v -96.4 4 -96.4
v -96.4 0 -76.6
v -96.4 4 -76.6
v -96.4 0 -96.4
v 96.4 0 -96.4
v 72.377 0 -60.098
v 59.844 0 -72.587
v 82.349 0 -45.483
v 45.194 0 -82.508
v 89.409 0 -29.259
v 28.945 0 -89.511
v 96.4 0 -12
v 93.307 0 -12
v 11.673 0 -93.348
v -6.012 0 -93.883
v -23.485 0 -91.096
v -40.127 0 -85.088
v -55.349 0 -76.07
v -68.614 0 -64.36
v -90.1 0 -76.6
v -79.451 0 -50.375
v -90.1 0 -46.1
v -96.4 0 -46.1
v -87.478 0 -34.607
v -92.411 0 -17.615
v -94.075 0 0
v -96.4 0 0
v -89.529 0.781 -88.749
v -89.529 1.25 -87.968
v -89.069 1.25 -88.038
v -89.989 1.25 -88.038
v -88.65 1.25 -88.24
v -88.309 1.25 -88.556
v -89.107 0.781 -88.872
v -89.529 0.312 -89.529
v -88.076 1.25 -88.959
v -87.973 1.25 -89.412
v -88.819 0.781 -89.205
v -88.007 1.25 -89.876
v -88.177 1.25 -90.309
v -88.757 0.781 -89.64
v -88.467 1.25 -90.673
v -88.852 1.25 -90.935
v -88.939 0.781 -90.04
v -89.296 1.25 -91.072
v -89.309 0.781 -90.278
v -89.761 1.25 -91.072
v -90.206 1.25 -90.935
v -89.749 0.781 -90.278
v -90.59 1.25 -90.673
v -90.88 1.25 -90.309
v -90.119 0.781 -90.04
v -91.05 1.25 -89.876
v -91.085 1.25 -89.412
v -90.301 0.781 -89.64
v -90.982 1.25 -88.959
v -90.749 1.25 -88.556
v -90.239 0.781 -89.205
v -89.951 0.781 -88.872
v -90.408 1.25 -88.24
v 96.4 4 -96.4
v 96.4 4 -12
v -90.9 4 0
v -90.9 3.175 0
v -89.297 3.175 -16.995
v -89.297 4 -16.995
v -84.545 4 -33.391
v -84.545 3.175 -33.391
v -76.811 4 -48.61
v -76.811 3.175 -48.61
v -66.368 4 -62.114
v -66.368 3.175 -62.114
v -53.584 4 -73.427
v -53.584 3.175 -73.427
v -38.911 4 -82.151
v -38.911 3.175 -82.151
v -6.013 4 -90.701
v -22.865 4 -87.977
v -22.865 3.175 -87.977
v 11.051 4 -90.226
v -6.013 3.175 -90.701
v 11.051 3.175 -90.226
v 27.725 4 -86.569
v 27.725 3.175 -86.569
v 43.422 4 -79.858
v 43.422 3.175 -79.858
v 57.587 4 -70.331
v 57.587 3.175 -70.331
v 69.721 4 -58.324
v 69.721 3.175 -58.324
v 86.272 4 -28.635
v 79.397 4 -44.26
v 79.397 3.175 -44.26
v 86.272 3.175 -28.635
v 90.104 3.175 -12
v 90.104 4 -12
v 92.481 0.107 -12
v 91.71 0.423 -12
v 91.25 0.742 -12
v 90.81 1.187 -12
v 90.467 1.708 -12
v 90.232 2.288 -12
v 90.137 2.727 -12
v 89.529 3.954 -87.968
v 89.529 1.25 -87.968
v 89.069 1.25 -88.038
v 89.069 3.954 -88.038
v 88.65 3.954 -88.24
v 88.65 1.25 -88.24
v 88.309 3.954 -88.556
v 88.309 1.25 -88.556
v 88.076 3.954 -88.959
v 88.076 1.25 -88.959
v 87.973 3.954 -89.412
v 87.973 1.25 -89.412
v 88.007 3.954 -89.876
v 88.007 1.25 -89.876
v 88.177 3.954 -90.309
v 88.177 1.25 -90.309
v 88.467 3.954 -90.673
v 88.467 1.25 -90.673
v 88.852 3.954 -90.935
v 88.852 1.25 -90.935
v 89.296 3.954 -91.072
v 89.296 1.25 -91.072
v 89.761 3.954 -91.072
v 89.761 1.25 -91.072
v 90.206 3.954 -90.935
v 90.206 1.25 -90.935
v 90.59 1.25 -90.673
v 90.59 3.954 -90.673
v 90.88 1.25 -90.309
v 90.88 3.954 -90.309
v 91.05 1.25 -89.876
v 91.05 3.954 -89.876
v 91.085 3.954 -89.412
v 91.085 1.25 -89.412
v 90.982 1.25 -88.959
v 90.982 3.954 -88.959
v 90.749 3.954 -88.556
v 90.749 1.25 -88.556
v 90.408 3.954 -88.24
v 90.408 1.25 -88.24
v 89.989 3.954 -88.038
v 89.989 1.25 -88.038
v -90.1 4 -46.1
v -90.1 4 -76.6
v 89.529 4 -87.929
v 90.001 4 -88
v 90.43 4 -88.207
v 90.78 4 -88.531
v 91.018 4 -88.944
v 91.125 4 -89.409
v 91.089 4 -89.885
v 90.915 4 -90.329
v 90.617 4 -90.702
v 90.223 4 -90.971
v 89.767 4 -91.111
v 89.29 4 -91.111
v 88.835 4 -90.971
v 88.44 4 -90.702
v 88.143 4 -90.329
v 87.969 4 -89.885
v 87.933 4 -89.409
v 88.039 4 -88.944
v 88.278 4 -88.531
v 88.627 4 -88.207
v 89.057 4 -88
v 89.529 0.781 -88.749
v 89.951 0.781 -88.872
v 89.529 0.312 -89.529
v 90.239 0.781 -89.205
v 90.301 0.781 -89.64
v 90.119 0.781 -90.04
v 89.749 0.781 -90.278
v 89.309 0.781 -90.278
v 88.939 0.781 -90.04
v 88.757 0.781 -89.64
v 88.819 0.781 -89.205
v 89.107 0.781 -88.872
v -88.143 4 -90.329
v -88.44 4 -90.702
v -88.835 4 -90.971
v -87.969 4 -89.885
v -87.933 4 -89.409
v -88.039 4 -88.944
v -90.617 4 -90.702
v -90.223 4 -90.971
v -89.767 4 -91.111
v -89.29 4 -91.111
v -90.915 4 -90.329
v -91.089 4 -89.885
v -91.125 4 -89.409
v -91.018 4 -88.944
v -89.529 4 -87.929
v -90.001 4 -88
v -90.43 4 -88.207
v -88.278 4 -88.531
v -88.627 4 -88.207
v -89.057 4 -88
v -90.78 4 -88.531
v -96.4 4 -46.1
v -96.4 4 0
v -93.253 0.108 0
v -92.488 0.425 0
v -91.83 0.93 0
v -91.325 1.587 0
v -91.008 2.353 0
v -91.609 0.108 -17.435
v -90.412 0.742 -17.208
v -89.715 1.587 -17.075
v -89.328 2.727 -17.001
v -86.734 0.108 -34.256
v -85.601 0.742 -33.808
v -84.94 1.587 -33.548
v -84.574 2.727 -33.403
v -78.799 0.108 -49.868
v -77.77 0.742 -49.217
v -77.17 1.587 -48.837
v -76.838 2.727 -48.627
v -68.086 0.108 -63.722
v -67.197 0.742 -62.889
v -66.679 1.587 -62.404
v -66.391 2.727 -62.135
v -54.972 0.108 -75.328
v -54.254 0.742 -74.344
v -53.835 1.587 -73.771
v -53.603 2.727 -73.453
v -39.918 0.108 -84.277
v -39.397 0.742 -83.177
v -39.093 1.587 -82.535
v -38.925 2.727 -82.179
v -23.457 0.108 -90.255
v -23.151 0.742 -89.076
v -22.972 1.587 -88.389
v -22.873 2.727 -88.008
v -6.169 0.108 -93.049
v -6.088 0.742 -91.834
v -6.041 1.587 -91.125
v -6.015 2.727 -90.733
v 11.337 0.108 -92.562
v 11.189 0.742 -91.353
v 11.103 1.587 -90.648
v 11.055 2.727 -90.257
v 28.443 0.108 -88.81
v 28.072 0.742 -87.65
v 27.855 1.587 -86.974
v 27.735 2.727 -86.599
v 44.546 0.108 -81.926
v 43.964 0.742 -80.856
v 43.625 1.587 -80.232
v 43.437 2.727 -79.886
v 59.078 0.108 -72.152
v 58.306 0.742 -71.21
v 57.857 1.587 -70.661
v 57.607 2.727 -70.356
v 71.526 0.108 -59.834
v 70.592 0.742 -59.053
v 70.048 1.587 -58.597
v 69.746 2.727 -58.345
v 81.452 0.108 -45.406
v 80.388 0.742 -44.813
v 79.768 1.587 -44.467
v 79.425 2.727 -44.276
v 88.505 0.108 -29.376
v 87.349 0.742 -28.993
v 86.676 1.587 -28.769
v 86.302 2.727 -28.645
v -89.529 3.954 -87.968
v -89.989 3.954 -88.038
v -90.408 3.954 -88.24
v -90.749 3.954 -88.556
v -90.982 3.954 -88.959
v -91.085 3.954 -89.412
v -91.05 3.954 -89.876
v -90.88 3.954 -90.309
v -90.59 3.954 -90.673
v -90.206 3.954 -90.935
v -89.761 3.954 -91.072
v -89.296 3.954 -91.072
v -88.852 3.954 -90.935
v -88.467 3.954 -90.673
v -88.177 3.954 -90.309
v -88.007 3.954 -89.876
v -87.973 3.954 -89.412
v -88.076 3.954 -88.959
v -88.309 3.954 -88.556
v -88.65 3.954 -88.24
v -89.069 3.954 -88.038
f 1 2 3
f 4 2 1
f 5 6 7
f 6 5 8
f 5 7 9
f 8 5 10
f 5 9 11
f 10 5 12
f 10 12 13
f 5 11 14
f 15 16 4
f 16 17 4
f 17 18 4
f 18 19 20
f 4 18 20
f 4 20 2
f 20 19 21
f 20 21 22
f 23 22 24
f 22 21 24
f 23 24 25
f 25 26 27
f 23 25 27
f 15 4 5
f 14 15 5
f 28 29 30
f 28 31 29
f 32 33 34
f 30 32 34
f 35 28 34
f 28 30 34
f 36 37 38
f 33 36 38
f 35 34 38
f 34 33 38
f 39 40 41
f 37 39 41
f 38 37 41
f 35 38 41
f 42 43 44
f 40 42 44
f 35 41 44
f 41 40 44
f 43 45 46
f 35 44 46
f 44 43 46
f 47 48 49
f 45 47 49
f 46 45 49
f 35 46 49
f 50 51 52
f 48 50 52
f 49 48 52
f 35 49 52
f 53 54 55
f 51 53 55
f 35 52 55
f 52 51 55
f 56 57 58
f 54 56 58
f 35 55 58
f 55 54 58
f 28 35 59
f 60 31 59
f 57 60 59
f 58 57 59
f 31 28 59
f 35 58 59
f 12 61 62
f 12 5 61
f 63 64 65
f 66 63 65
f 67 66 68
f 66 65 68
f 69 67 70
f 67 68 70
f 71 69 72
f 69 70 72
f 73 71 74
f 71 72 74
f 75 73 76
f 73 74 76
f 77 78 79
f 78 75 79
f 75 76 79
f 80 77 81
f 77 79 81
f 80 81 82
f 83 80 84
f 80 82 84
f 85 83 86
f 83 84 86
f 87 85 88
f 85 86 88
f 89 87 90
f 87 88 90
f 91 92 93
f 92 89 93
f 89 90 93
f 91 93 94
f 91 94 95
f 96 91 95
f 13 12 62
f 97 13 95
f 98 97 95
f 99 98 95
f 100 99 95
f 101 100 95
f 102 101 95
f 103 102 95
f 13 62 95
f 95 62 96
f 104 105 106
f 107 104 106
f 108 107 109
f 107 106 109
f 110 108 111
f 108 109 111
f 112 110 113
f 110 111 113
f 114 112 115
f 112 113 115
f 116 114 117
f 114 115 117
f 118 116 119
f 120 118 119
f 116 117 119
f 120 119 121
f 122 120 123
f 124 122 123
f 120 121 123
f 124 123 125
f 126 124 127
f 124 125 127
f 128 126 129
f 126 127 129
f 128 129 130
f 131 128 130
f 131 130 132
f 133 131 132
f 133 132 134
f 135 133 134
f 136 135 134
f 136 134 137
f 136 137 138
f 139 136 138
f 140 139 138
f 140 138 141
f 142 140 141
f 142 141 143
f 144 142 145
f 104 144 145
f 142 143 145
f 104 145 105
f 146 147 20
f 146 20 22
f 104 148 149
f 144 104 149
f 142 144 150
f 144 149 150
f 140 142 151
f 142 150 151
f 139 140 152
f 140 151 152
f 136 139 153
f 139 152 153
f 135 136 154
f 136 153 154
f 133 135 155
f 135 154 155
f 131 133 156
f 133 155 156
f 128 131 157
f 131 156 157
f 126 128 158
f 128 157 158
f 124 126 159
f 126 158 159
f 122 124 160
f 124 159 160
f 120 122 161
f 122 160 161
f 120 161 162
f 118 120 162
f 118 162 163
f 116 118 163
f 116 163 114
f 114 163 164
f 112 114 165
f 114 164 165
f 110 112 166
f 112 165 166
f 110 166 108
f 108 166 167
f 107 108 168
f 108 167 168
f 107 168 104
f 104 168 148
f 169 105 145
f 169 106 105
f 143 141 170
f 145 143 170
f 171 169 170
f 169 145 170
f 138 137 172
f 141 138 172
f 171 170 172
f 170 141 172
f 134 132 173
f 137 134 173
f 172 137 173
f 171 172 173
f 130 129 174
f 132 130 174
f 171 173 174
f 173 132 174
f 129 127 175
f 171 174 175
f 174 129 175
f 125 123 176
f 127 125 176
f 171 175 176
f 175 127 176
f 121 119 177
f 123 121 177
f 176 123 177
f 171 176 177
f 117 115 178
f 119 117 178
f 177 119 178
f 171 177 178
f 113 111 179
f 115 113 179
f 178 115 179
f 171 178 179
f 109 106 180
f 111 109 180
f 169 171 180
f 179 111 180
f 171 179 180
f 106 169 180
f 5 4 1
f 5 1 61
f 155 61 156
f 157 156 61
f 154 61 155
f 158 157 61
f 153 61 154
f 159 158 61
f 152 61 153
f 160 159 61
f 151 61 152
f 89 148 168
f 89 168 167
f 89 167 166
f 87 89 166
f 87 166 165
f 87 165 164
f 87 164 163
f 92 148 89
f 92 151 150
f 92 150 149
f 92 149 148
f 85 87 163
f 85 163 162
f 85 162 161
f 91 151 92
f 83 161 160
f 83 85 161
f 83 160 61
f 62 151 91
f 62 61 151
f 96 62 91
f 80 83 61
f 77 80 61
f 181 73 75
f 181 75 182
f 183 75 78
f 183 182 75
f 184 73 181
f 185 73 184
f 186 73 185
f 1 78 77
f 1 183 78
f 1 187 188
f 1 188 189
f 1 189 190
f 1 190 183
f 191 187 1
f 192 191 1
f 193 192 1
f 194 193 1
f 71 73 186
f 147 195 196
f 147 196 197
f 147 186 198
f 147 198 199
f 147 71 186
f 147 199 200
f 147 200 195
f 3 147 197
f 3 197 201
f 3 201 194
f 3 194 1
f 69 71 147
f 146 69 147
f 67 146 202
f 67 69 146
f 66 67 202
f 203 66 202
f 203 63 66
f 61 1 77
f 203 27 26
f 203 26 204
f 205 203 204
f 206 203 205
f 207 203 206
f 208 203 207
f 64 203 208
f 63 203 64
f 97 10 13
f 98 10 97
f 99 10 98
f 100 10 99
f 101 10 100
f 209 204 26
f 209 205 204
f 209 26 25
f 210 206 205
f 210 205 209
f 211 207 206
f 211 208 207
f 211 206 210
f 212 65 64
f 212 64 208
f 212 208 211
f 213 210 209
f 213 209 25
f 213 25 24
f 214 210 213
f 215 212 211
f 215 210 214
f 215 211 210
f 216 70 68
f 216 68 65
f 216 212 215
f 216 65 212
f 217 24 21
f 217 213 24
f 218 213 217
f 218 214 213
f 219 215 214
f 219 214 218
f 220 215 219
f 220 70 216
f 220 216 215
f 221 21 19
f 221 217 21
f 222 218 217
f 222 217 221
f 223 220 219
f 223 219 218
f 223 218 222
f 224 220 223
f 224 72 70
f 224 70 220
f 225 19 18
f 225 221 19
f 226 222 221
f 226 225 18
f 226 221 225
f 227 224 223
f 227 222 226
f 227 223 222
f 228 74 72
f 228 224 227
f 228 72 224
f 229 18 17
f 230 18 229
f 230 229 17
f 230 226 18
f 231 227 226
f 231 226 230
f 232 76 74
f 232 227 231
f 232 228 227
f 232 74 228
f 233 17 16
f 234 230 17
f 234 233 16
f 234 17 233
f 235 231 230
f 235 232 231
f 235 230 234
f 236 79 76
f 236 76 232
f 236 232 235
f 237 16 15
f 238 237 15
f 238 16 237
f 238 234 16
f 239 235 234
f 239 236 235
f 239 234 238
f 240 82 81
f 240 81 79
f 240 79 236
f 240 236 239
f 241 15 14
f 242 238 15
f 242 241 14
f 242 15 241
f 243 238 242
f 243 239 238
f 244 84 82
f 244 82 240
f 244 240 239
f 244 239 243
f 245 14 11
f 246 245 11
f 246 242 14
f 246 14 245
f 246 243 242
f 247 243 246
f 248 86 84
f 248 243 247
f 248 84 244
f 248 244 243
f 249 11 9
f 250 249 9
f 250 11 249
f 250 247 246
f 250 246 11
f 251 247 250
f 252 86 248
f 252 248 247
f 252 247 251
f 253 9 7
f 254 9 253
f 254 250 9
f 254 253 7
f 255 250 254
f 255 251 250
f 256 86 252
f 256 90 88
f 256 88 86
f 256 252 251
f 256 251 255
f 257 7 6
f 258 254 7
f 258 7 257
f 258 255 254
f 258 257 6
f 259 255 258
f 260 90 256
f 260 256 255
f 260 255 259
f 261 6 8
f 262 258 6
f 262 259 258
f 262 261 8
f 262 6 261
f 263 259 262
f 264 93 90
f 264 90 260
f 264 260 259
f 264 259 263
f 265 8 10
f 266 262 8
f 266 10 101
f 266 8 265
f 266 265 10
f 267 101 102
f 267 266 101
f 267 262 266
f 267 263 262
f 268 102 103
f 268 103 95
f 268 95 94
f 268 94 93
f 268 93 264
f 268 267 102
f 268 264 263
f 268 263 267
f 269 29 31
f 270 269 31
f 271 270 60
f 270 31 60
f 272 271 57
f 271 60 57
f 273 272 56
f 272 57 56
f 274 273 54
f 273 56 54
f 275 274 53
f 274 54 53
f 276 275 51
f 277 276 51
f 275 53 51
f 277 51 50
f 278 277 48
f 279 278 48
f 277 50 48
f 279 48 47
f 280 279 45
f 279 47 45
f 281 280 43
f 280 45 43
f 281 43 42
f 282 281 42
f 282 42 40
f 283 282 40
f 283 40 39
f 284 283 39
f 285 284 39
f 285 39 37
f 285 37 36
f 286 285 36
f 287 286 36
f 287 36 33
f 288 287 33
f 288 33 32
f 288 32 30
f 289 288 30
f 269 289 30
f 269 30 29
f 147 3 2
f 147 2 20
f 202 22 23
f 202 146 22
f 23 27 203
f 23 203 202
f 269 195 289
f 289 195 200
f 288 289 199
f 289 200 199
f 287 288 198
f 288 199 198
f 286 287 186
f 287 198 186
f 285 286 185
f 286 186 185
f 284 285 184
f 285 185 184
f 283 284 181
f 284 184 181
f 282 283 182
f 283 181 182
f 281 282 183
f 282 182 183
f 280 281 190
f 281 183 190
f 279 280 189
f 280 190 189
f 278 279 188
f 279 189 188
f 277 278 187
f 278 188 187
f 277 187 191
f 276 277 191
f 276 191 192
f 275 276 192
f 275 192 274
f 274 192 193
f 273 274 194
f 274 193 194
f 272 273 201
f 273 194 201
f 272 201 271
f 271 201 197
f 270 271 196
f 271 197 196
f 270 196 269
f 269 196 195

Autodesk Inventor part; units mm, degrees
ref_plane "YZ Plane" through (0, 0, 0) normal (1, 0, 0) x (0, 1, 0)
ref_plane "XZ Plane" through (0, 0, 0) normal (0, 1, 0) x (-1, 0, 0)
ref_plane "XY Plane" through (0, 0, 0) normal (0, 0, 1) x (1, 0, 0)
sketch "Sketch1" plane through (0, 0, 0) normal (0, 1, 0) x (-1, 0, 0)
  line L0 (101.6, -101.6) -> (-101.6, -101.6)
  line L1 (-101.6, -101.6) -> (-101.6, 101.6)
  line L2 (-101.6, 101.6) -> (101.6, 101.6)
  line L3 (101.6, 101.6) -> (101.6, -101.6)
  line L4 (96.6, -96.6) -> (-96.6, -96.6)
  line L5 (-96.6, -96.6) -> (-96.6, 96.6)
  line L6 (-96.6, 96.6) -> (96.6, 96.6)
  line L7 (96.6, 96.6) -> (96.6, -96.6)
  line L8 (101.6, 101.6) -> (-40.4, 101.6)
  circle A0 centre (0, 0) radius 88.9
  line L9 (-40.4, 101.6) -> (-101.6, 40.4)
  line L10 (-45.4, 101.6) -> (-101.6, 45.4)
  line L11 (96.6, 96.6) -> (96.6, 101.6)
  line L12 (-45.4, 101.6) -> (-35.4, 101.6)
  line L13 (-35.4, 101.6) -> (-35.4, 96.6)
  line L14 (-35.4, 96.6) -> (-45.4, 96.6)
  line L15 (-45.4, 96.6) -> (-45.4, 101.6)
  line L16 (-101.6, 39.4) -> (-39.4, 101.6)
  line L17 (96.4, -96.4) -> (-96.4, -96.4)
  line L18 (-96.4, -96.4) -> (-96.4, 96.4)
  line L19 (-96.4, 96.4) -> (96.4, 96.4)
  line L20 (96.4, 96.4) -> (96.4, -96.4)
  circle A1 centre (0, 0) radius 90.9
  point P0 (96.6, 51.2168)
  point P1 (101.6, 40.4)
  point P2 (101.6, -40.4)
  point P3 (96.6, -51.2168)
  point P4 (-96.6, 45.4)
  point P5 (-45.4, 96.6)
  point P6 (-44.6, 96.4)
  point P7 (-96.4, 44.6)
  dimension "d0" = 203.2
  dimension "d1" = 203.2
  dimension "d2" = 101.6
  dimension "d3" = 101.6
  dimension "d4" = 5
  dimension "d5" = 5
  dimension "d6" = 5
  dimension "d7" = 5
  dimension "d8" = 142
  dimension "d9" = 61.2
  dimension "d10" = 177.8
  dimension "d11" = 5
  dimension "d12" = 5
  dimension "d13" = 10
  dimension "d14" = 1
  dimension "d15" = 0.2
  dimension "d16" = 0.2
  dimension "d17" = 0.2
  dimension "d18" = 0.2
  dimension "d64" = 181.8
extrude "Extrusion1" add sketch "Sketch1" along normal blind 4 contours L16 L19 L20 L17 L18
sketch "Sketch6" plane through (0, 4, 0) normal (0, 1, 0) x (1, 0, 0)
  line L0 (96.4, 96.4) -> (-96.4, 96.4) projected
  line L1 (96.4, 96.4) -> (88.4, 96.4)
  line L2 (88.4, 96.4) -> (88.4, -45.6)
  line L3 (88.4, -45.6) -> (96.4, -45.6)
  line L4 (96.4, -45.6) -> (96.4, 96.4)
  line L5 (96.4, -44.6) -> (96.4, 96.4) projected
  line L6 (88.4, -12) -> (96.4, -12)
  line L7 (96.4, -12) -> (96.4, 12)
  line L8 (96.4, 12) -> (88.4, 12)
  line L9 (88.4, 12) -> (88.4, -12)
  line L10 (0, 0) -> (96.4, 0)
  point P0 (96.4, -12)
  dimension "d58" = 8
  dimension "d59" = 142
  dimension "d62" = 12
  dimension "d63" = 12
extrude "Extrusion6" cut sketch "Sketch6" against normal blind 25.4 contours L4 L10 L2 L8 | L4 L6 L2 L10
sketch "Sketch8" plane through (0, 4, 0) normal (0, 1, 0) x (1, 0, 0)
  line L0 (-96.6, 96.6) -> (-96.6, -96.6)
  line L1 (96.6, 96.6) -> (-96.6, 96.6)
  line L2 (-96.6, 96.6) -> (96.6, 96.6)
  line L3 (96.6, -45.4) -> (45.4, -96.6)
  line L4 (96.6, 96.6) -> (96.6, -45.4)
  line L5 (96.6, -45.4) -> (45.4, -96.6)
  line L6 (45.4, -96.6) -> (-96.6, -96.6)
  line L7 (-96.6, -96.6) -> (-96.6, 96.6)
  line L8 (-96.6, 96.6) -> (-89.5289, 89.5289)
  circle A0 centre (-89.5289, 89.5289) radius 5
  circle A1 centre (-89.5289, 89.5289) radius 1.5
  line L9 (-89.5289, 84.5289) -> (-96.6, 84.5289)
  line L10 (-89.5289, 89.5289) -> (-89.5289, 84.5289)
  line L11 (-89.5289, 89.5289) -> (-84.5289, 89.5289)
  line L12 (-84.5289, 96.6) -> (-84.5289, 89.5289)
  line L13 (-96.6, -96.6) -> (-89.5289, -89.5289)
  line L14 (-96.6, -96.6) -> (-86.6, -96.6) construction
  circle A2 centre (-89.5289, -89.5289) radius 5
  circle A3 centre (-89.5289, -89.5289) radius 1.75
  line L15 (-89.5289, -89.5289) -> (-84.5289, -89.5289)
  line L16 (-84.5289, -96.6) -> (-84.5289, -89.5289)
  line L17 (-89.5289, -89.5289) -> (-89.5289, -84.5289)
  line L18 (-96.6, -84.5289) -> (-89.5289, -84.5289)
  line L19 (96.6, 96.6) -> (89.5289, 89.5289)
  circle A4 centre (89.5289, 89.5289) radius 5
  circle A5 centre (89.5289, 89.5289) radius 1.75
  line L20 (89.5289, 89.5289) -> (84.5289, 89.5289)
  line L21 (84.5289, 96.6) -> (84.5289, 89.5289)
  line L22 (89.5289, 89.5289) -> (89.5289, 84.5289)
  line L23 (96.6, 84.5289) -> (89.5289, 84.5289)
  line L24 (96.6, -43.114) -> (96.6, 96.6)
  line L25 (-96.6, -96.6) -> (43.1178, -96.6)
  line L26 (28.9914, 5.6569) -> (-5.6569, -28.9914)
  line L27 (25.4, -25.4) -> (101.6, -25.4)
  line L28 (101.6, -88.9) -> (101.6, 101.6)
  line L29 (25.4, -25.4) -> (25.4, -101.6)
  line L30 (43.1178, -101.6) -> (-101.6, -101.6)
  line L31 (96.6, -25.4) -> (86.6, -25.4)
  circle A6 centre (86.6, -25.4) radius 5
  circle A7 centre (86.6, -25.4) radius 1.75
  line L32 (25.4, -96.6) -> (25.4, -86.6)
  circle A8 centre (25.4, -86.6) radius 5
  circle A9 centre (25.4, -86.6) radius 1.75
  line L33 (44.6, -96.4) -> (96.4, -44.6) projected
  circle A10 centre (68.7322, -68.7322) radius 1
  point P0 (0, 0)
  point P1 (0, 0)
  point P2 (0, 0)
  dimension "d90" = 10
  dimension "d91" = 3
  dimension "d92" = 10
  dimension "d93" = 45
  dimension "d94" = 10
  dimension "d95" = 3.5
  dimension "d96" = 10
  dimension "d97" = 10
  dimension "d98" = 3.5
  dimension "d99" = 76.2
  dimension "d100" = 76.2
  dimension "d101" = 10
  dimension "d102" = 10
  dimension "d103" = 3.5
  dimension "d104" = 10
  dimension "d105" = 10
  dimension "d106" = 3.5
  dimension "d115" = 2
  dimension "d116" = 2.5
hole "Hole1" at (-89.5289, 4, -89.5289) at (89.5289, 4, -89.5289) at (-89.5289, 4, 89.5289) at (68.7322, 4, 68.7322) direction (0, -1, 0) diameter 3.1211 depth 2.75 tip angle 118 countersink diameter 3.2004 countersink angle 82 thread size "M3.5x0.35" class "6H" standard "ANSI Metric M Profile"
fillet "Fillet1" radius 3.175 2 edges at (-6.0132, 0, -90.7009) (-6.0132, 0, 90.7009)
sketch "Sketch9" plane through (0, 4, 0) normal (0, 1, 0) x (1, 0, 0)
  arc A0 (-101.6, -98.425) -> (-98.425, -101.6) centre (-98.425, -98.425) ccw
  line L0 (44.0849, 101.6) -> (-98.425, 101.6)
  line L1 (-101.6, 98.425) -> (-101.6, -98.425)
  line L2 (-101.6, -46.1) -> (-101.6, -76.6)
  line L3 (-96.6, -96.6) -> (-96.6, 96.6)
  line L4 (-96.6, -46.1) -> (-96.6, -76.6)
  line L5 (-101.6, -76.6) -> (-96.6, -76.6)
  line L6 (-101.6, -46.1) -> (-96.6, -46.1)
  line L7 (-98.425, -101.6) -> (101.6, -101.6)
  line L8 (0, 0) -> (-101.6, 0)
  line L9 (-101.6, 46.1) -> (-101.6, 76.6)
  line L10 (-96.6, 46.1) -> (-96.6, 76.6)
  line L11 (-101.6, 76.6) -> (-96.6, 76.6)
  line L12 (-101.6, 46.1) -> (-96.6, 46.1)
  line L13 (-96.6, -76.6) -> (-90.1, -76.6)
  line L14 (-90.1, -76.6) -> (-90.1, -46.1)
  line L15 (-90.1, -46.1) -> (-96.6, -46.1)
  line L16 (-96.6, -46.1) -> (-96.6, -76.6)
  arc A1 (-98.425, 101.6) -> (-101.6, 98.425) centre (-98.425, 98.425) ccw
  line L17 (-101.6, 46.1) -> (-96.6, 46.1)
  line L18 (-90.1, 46.1) -> (-96.6, 46.1)
  line L19 (-101.6, 46.1) -> (-101.6, 76.6)
  line L20 (-96.6, 46.1) -> (-96.6, 76.6)
  line L21 (-96.6, 46.1) -> (-96.6, 76.6)
  line L22 (-90.1, 76.6) -> (-90.1, 46.1)
  line L23 (-101.6, 76.6) -> (-96.6, 76.6)
  line L24 (-96.6, 76.6) -> (-90.1, 76.6)
  point P0 (-98.425, 98.425)
  point P1 (46.1, 101.6)
  point P2 (46.1, 96.6)
  point P3 (76.6, 96.6)
  point P4 (76.6, 101.6)
  point P5 (-46.1, 96.6)
  dimension "d117" = 30.5
  dimension "d118" = 25
  dimension "d119" = 6.5
extrude "Extrusion7" cut sketch "Sketch9" against normal blind 25.4 contours L24 L22 L18 L3 | L15 L14 L13 L3
sketch "Sketch10" plane through (0, 4, 0) normal (0, 1, 0) x (1, 0, 0)
  line L0 (-96.3514, 0) -> (-90.9, 0)
  arc A0 (90.1044, 12) -> (90.1044, -12) centre (0, 0) ccw projected
ref_plane "Work Plane1" through (-96.3514, 4, 0) normal (0, 0, 1) x (1, 0, 0)
sketch "Sketch11" plane through (-96.3514, 4, 0) normal (0, 0, 1) x (1, 0, 0)
  line L0 (-51.1439, 37.1405) -> (237.6314, 37.1405)
  line L1 (237.6314, 37.1405) -> (237.6314, -59.6996)
  line L2 (237.6314, -59.6996) -> (-51.1439, -59.6996)
  line L3 (-51.1439, -59.6996) -> (-51.1439, 37.1405)
  point P0 (96.3514, -4)
extrude "Extrusion8" cut sketch "Sketch11" along normal through all
equation "\"d1\" = d0"
equation "\"d2\" = 0.5 * d0"
equation "\"d3\" = 0.5 * d0"
equation "\"d15\" = d17"
equation "\"d16\" = d17"
equation "\"d18\" = d17"
properties part number "Drop_Plate"
